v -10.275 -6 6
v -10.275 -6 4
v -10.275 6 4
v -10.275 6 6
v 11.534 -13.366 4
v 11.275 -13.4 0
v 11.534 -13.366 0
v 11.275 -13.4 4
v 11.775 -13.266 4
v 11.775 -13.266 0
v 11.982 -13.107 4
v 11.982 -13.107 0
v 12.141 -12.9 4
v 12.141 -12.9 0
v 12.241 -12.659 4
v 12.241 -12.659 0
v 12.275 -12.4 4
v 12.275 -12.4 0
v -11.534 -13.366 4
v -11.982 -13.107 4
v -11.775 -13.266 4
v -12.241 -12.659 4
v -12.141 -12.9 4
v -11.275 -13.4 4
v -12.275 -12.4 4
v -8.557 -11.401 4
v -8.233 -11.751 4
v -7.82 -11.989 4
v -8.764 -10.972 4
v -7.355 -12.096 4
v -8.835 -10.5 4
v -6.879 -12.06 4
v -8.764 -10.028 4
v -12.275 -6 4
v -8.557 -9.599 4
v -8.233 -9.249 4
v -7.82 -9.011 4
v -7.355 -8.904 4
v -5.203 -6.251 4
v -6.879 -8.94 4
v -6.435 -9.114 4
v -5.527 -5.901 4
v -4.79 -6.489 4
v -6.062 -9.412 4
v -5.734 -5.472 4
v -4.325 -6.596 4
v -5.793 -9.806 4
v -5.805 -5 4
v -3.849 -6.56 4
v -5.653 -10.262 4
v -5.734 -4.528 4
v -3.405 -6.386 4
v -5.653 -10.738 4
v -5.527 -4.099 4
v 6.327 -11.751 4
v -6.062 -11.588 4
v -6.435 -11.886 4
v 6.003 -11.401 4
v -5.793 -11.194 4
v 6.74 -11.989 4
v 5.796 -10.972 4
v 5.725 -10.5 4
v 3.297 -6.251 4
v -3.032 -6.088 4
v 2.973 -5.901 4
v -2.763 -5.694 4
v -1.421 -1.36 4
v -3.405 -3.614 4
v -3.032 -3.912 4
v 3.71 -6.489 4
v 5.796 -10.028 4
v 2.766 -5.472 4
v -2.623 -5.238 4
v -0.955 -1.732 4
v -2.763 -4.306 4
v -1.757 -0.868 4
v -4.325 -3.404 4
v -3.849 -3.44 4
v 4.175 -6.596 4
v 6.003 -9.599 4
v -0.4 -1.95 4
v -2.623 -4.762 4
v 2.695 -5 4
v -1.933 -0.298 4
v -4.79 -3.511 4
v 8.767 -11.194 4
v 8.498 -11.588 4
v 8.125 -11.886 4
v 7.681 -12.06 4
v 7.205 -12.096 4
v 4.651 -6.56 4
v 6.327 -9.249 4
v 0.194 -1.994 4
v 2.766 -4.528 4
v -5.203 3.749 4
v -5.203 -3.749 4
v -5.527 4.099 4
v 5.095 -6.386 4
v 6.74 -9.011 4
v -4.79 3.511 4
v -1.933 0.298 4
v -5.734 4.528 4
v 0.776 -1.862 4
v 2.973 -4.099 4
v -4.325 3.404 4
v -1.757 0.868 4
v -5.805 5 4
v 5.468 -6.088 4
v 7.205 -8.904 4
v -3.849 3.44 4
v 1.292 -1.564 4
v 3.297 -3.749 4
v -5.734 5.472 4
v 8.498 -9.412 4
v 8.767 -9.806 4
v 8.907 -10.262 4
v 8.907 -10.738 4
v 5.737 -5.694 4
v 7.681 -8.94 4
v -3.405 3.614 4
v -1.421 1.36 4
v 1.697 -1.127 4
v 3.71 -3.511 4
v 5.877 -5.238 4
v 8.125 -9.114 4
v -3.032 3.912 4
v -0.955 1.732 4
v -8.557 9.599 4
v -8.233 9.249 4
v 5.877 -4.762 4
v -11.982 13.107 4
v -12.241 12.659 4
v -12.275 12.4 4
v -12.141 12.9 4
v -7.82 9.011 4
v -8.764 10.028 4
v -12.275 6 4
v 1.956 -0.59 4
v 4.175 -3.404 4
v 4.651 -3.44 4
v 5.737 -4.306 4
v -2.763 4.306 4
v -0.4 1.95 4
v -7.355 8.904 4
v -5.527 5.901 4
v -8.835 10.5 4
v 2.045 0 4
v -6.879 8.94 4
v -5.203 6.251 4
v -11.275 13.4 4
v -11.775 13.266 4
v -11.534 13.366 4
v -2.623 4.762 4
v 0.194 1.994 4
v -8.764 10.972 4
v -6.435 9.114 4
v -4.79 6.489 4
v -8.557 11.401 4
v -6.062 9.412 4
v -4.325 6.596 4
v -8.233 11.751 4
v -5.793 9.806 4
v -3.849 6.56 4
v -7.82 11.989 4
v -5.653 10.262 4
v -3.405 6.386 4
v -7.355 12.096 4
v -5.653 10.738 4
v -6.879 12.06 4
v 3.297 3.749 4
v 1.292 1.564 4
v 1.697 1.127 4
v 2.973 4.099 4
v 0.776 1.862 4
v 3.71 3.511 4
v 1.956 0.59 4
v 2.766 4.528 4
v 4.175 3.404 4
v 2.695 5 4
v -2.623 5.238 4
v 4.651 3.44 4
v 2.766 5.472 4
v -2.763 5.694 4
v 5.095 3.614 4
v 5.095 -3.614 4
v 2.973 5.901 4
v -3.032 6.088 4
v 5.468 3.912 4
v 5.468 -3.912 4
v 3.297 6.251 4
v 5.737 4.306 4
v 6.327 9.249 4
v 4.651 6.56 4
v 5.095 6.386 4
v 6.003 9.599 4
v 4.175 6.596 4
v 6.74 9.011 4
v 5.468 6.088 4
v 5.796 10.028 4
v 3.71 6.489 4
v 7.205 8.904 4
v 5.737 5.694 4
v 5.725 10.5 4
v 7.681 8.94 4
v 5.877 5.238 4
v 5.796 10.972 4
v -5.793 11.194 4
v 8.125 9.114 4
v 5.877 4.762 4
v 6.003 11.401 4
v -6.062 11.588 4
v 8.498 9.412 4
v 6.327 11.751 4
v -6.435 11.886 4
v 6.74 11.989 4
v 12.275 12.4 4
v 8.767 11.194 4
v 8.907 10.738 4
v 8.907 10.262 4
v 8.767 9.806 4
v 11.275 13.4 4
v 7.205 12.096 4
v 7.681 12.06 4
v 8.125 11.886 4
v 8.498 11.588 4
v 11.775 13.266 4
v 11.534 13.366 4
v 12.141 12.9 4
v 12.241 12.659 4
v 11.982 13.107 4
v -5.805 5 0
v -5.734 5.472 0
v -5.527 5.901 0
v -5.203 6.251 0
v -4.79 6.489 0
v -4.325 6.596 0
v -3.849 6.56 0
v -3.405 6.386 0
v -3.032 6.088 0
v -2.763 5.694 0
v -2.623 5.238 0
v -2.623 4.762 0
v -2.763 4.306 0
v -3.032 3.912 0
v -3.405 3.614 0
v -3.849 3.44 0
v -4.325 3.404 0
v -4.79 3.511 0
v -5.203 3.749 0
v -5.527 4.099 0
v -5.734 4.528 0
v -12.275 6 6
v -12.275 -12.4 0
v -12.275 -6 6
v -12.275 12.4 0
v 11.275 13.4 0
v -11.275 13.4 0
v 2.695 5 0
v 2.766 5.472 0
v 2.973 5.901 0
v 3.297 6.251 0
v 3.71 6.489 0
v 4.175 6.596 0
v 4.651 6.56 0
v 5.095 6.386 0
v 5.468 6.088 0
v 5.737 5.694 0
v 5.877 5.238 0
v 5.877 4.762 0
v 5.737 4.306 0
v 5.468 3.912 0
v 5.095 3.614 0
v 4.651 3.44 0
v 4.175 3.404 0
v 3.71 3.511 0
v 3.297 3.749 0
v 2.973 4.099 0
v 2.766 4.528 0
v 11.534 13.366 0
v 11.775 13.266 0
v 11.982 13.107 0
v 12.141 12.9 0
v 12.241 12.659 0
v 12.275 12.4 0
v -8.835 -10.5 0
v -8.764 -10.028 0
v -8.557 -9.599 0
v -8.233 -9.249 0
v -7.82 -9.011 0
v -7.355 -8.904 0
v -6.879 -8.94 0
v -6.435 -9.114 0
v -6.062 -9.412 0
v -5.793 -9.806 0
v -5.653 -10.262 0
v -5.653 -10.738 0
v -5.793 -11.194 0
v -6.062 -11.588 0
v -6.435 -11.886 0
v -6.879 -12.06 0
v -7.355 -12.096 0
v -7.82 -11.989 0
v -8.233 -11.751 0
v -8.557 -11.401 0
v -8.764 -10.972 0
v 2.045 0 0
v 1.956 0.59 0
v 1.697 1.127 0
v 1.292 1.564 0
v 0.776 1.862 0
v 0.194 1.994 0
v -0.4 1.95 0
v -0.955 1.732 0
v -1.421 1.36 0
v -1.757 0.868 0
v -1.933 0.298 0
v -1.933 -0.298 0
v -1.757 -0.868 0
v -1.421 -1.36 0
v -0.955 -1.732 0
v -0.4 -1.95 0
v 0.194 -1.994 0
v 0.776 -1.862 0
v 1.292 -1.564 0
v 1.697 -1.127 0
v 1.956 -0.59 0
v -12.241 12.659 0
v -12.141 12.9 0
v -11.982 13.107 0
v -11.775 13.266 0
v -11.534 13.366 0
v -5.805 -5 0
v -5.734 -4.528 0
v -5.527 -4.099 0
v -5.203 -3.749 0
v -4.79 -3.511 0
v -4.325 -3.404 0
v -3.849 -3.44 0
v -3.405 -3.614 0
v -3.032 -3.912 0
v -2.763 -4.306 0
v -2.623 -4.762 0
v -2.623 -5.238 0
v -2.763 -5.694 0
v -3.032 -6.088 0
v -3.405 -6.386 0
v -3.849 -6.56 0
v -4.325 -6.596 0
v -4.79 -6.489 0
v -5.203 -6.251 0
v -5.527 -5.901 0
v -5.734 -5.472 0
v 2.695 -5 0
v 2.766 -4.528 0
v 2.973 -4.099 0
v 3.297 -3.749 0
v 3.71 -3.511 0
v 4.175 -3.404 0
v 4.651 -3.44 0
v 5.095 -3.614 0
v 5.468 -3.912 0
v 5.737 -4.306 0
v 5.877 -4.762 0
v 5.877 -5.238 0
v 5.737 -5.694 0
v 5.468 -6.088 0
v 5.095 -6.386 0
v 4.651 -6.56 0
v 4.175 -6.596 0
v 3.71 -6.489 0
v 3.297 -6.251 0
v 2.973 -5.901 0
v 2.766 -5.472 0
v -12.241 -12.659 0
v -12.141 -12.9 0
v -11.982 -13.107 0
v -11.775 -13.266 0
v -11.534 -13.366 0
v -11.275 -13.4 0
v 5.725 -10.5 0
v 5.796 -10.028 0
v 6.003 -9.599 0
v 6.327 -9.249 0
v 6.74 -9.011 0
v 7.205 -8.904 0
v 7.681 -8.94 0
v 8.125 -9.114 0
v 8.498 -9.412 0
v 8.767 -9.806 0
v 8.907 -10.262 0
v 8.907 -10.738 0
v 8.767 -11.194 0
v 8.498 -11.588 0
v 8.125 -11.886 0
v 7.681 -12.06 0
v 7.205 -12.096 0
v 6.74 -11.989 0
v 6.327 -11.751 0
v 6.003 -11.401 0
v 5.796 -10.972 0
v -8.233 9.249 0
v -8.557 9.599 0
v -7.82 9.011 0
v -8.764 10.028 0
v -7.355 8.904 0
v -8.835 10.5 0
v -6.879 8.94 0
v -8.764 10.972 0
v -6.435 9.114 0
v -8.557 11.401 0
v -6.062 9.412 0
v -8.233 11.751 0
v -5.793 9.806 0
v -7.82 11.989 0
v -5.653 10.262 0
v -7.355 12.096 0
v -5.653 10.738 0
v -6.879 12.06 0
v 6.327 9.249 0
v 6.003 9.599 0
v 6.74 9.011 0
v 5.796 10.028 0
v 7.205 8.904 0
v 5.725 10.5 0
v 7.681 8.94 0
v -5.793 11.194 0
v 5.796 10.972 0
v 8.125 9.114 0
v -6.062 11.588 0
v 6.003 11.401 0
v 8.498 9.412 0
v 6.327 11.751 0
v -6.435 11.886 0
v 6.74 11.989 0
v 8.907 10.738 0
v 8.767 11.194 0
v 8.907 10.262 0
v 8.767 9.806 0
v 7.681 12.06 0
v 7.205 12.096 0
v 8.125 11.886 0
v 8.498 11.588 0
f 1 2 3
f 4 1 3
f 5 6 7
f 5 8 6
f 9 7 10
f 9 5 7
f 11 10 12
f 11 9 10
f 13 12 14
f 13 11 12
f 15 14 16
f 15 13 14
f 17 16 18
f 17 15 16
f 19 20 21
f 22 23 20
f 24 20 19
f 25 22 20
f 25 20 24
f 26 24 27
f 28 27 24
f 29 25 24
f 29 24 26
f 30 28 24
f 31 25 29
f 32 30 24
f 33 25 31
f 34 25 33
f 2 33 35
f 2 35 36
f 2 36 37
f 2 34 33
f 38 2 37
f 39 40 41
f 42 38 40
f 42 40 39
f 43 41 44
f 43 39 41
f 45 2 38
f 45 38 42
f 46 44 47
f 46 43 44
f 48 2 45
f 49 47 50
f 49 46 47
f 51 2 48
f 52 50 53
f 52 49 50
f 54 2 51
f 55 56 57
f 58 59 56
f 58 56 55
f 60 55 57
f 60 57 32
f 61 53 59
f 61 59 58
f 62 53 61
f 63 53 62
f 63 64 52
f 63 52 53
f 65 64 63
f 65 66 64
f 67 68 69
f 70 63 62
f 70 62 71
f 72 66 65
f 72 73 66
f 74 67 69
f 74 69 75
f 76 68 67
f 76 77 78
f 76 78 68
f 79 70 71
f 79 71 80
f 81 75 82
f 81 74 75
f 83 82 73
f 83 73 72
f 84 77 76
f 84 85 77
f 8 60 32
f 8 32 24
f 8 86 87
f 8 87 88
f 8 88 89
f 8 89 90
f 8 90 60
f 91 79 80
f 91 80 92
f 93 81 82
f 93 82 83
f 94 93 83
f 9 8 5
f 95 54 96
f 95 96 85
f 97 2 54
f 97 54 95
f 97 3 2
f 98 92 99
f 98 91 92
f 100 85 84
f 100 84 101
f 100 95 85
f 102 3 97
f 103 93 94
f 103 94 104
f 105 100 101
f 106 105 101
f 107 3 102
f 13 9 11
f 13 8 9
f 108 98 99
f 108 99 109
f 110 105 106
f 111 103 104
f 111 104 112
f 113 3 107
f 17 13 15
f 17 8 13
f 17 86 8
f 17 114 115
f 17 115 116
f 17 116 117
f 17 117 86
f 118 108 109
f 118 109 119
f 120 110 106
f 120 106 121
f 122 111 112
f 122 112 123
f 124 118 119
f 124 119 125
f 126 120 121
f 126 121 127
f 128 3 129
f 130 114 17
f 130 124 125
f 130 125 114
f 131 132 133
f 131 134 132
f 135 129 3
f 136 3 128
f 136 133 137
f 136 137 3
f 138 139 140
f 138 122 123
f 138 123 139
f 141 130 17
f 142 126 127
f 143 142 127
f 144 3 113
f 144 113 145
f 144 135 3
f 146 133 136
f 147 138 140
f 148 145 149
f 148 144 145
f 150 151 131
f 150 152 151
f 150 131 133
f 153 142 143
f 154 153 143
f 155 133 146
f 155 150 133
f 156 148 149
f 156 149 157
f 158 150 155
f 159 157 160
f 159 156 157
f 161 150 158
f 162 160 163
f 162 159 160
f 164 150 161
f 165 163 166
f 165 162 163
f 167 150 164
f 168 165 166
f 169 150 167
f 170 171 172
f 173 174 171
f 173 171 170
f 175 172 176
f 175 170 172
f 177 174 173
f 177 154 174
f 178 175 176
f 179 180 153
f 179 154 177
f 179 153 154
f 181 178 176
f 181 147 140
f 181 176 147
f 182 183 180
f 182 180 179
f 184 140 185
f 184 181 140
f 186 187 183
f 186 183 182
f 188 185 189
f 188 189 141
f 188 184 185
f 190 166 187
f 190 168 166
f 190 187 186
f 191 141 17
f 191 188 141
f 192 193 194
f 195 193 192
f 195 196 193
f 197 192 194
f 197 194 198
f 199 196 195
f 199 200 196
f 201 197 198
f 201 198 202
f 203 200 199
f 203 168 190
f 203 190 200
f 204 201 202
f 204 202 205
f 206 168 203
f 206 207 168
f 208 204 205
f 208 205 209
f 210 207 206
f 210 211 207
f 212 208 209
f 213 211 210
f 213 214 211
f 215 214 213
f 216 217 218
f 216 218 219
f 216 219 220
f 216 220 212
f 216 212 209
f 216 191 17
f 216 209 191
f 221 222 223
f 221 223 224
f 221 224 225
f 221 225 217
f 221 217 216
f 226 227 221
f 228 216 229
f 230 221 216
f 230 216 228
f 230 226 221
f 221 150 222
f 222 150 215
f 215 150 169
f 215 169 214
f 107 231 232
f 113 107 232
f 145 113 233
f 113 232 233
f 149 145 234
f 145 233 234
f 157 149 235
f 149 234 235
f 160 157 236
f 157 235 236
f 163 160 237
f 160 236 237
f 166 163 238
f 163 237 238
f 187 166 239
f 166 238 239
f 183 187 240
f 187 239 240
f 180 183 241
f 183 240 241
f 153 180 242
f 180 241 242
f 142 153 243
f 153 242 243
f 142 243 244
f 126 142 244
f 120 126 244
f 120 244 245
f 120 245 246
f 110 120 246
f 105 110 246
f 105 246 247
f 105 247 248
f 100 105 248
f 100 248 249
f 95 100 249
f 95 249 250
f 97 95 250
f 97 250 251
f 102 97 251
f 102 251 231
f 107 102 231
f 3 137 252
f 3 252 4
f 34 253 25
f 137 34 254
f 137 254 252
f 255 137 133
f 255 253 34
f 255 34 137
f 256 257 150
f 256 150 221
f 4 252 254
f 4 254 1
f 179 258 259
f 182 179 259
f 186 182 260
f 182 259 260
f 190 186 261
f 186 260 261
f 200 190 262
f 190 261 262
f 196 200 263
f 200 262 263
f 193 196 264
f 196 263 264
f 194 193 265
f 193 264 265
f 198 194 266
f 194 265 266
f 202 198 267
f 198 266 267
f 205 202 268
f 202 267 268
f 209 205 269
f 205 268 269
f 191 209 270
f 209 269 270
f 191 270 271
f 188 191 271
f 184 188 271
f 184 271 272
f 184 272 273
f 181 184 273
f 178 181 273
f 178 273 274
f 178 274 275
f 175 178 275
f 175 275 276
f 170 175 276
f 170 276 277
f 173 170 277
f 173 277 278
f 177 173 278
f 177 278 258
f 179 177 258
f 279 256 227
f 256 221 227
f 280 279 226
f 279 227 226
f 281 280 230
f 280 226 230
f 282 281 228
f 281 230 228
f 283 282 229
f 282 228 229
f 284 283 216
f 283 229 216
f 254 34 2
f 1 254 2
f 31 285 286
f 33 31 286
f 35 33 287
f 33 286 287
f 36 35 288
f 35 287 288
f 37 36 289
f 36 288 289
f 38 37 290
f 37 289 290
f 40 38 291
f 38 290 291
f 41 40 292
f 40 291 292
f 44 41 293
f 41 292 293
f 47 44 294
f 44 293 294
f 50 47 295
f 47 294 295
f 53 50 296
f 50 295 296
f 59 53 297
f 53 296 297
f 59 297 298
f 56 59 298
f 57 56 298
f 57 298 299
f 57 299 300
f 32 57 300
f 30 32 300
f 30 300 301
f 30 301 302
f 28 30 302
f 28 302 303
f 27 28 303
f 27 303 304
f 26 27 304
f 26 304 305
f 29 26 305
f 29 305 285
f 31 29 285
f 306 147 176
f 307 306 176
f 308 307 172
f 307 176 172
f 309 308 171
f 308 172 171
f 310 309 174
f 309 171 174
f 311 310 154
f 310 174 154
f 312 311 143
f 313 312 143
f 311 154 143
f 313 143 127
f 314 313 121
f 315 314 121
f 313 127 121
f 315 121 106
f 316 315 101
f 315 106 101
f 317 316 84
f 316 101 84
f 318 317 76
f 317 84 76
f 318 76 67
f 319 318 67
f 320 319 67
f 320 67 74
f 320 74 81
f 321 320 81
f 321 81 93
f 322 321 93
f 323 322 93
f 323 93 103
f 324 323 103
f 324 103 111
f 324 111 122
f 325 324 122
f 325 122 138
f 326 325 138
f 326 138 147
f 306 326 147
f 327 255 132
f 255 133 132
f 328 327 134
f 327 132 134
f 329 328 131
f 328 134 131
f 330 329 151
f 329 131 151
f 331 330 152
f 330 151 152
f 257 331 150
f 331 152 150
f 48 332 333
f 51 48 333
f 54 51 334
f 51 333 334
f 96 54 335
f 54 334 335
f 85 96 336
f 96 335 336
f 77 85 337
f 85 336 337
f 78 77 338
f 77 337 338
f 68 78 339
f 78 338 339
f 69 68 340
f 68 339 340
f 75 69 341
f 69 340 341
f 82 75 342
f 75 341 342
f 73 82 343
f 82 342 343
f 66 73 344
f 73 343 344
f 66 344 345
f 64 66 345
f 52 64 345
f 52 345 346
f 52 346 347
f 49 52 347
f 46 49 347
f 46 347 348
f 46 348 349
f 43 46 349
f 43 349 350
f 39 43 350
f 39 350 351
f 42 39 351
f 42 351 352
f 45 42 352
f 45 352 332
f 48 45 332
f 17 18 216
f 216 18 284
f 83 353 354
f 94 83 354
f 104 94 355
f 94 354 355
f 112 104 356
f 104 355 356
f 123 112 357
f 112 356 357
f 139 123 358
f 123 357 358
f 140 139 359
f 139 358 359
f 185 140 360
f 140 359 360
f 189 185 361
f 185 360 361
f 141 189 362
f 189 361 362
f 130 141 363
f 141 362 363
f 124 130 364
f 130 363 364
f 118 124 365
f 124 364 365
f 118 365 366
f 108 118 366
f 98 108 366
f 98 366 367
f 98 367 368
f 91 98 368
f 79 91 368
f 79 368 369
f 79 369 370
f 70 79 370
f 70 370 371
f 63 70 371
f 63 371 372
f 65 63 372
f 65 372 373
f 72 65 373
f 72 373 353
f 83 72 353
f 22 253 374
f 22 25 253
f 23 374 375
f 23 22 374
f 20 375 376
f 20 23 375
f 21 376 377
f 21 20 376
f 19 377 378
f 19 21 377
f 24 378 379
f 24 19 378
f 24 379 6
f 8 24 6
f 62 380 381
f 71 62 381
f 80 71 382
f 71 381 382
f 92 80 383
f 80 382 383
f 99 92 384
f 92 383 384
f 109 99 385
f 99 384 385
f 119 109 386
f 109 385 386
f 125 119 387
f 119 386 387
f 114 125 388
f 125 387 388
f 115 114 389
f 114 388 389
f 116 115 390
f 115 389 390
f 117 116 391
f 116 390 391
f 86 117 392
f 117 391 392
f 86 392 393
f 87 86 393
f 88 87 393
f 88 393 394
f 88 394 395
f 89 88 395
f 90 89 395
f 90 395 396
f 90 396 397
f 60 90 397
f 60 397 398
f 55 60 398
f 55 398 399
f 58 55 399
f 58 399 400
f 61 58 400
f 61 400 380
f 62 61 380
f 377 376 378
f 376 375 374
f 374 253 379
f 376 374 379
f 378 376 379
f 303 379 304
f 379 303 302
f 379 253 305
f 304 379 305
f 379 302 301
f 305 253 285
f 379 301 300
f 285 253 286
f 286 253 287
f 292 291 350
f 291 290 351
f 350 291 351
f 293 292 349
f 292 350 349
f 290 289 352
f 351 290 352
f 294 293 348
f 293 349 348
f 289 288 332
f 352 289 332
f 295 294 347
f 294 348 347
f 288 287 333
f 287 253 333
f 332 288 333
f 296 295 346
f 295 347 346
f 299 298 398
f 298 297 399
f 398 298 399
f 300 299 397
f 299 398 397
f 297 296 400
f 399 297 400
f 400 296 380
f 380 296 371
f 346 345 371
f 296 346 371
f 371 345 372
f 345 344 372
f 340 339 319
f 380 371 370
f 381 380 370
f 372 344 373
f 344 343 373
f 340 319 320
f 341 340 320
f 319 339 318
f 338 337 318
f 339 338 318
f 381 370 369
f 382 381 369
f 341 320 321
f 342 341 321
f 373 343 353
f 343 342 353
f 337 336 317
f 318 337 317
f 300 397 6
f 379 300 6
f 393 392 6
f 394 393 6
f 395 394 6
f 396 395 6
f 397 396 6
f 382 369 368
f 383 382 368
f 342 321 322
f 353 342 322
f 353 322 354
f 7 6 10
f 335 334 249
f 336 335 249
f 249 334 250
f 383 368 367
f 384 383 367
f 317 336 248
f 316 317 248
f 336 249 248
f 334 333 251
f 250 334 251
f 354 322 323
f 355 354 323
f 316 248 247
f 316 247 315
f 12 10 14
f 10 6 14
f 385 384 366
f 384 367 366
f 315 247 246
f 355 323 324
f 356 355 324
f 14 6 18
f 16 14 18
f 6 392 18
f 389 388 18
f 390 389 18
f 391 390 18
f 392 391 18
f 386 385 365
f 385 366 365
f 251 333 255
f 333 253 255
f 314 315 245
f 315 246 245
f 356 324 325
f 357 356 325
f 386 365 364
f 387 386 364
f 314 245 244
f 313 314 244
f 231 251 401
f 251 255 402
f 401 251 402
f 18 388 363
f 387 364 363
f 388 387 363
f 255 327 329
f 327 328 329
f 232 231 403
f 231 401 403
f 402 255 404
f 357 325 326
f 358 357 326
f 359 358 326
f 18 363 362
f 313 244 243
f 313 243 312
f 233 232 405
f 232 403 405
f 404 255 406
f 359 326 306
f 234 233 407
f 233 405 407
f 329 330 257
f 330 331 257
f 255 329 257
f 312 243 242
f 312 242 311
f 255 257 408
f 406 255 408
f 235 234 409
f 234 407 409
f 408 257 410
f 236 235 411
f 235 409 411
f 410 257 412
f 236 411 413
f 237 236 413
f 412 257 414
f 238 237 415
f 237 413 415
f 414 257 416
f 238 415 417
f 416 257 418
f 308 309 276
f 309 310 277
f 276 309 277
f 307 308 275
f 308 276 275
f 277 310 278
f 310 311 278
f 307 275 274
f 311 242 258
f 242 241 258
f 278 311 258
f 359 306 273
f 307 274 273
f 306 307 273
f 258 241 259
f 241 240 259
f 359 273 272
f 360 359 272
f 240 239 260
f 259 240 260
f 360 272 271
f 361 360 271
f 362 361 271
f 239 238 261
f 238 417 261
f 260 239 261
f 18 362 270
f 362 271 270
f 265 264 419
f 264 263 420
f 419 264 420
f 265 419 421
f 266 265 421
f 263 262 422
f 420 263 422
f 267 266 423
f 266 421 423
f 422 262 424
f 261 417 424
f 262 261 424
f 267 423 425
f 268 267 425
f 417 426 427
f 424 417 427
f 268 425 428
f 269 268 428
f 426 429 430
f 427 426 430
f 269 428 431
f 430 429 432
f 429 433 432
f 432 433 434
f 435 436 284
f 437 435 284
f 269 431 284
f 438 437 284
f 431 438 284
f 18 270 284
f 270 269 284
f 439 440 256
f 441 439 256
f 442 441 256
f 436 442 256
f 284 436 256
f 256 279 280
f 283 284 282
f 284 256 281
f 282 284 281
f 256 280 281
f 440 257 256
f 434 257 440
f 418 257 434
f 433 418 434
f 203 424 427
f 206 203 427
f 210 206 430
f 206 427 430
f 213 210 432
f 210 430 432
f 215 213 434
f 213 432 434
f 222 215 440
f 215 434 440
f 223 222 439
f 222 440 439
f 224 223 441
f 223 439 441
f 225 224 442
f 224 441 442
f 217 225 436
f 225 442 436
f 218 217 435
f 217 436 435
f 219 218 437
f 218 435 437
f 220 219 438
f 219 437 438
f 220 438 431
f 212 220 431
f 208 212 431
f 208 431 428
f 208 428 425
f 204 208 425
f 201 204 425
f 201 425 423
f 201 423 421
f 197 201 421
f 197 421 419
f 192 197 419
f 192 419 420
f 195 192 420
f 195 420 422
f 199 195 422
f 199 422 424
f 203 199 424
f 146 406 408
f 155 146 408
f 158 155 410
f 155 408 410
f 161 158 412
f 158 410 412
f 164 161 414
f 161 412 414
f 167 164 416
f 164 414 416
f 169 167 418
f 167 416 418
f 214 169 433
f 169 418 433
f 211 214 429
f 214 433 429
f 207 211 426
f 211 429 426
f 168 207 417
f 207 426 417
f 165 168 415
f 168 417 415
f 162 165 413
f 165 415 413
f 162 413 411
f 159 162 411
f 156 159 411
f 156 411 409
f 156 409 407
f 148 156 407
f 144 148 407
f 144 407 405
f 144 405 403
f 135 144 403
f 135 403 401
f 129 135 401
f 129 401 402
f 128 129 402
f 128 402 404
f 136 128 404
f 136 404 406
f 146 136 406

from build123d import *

# Parameters (mm, degrees)
SCHIZZO1_W                   = 24.55
SCHIZZO1_H                   = 26.8
ESTRUSIONE_ESTRUSIONE1_DEPTH = 4
FORO_PER_VITE_M3_1_D         = 3.2
FORO_PER_VITE_M3_2_D         = 3.2
SCHIZZO5_R                   = 2
TAGLIO_ESTRUSIONE1_DEPTH     = 10
SCHIZZO6_W                   = 2
SCHIZZO6_H                   = 12
ESTRUSIONE_ESTRUSIONE2_DEPTH = 2
RACCORDO1_R                  = 1


with BuildPart() as part:
    # Schizzo1 → Estrusione-Estrusione1 (new body)
    with BuildSketch(Plane.XY):
        Rectangle(SCHIZZO1_W, SCHIZZO1_H)
    extrude(amount=ESTRUSIONE_ESTRUSIONE1_DEPTH)

    # Foro per Vite M3-1 (through all)
    with Locations(Plane.XY.offset(4)):
        with Locations((-4.205, 5), (4.295, 5), (4.295, -5), (-4.205, -5)):
            Hole(FORO_PER_VITE_M3_1_D / 2)

    # Foro per Vite M3-2 (through all)
    with Locations(Plane(origin=(-7.235, 10.5, 4), x_dir=(1, 0, 0), z_dir=(0, 0, 1))):
        with Locations((0, 0), (14.56, 0), (0, -21), (14.56, -21)):
            Hole(FORO_PER_VITE_M3_2_D / 2)

    # Schizzo5 → Taglio-Estrusione1 (cut)
    with BuildSketch(Plane.XY.offset(4)):
        with Locations((0.045, 0)):
            Circle(SCHIZZO5_R)
    extrude(amount=-TAGLIO_ESTRUSIONE1_DEPTH, mode=Mode.SUBTRACT)

    # Schizzo6 → Estrusione-Estrusione2 (add)
    with BuildSketch(Plane.XY.offset(4)):
        with Locations((-11.275, 0)):
            Rectangle(SCHIZZO6_W, SCHIZZO6_H)
    extrude(amount=ESTRUSIONE_ESTRUSIONE2_DEPTH)

    # Raccordo1
    raccordo1_edges = [part.edges().sort_by_distance(p)[0] for p in [
        (12.275, -13.4, 2),
        (-12.275, -13.4, 2),
        (-12.275, 13.4, 2),
        (12.275, 13.4, 2),
    ]]
    fillet(raccordo1_edges, radius=RACCORDO1_R)


solid = part.part
